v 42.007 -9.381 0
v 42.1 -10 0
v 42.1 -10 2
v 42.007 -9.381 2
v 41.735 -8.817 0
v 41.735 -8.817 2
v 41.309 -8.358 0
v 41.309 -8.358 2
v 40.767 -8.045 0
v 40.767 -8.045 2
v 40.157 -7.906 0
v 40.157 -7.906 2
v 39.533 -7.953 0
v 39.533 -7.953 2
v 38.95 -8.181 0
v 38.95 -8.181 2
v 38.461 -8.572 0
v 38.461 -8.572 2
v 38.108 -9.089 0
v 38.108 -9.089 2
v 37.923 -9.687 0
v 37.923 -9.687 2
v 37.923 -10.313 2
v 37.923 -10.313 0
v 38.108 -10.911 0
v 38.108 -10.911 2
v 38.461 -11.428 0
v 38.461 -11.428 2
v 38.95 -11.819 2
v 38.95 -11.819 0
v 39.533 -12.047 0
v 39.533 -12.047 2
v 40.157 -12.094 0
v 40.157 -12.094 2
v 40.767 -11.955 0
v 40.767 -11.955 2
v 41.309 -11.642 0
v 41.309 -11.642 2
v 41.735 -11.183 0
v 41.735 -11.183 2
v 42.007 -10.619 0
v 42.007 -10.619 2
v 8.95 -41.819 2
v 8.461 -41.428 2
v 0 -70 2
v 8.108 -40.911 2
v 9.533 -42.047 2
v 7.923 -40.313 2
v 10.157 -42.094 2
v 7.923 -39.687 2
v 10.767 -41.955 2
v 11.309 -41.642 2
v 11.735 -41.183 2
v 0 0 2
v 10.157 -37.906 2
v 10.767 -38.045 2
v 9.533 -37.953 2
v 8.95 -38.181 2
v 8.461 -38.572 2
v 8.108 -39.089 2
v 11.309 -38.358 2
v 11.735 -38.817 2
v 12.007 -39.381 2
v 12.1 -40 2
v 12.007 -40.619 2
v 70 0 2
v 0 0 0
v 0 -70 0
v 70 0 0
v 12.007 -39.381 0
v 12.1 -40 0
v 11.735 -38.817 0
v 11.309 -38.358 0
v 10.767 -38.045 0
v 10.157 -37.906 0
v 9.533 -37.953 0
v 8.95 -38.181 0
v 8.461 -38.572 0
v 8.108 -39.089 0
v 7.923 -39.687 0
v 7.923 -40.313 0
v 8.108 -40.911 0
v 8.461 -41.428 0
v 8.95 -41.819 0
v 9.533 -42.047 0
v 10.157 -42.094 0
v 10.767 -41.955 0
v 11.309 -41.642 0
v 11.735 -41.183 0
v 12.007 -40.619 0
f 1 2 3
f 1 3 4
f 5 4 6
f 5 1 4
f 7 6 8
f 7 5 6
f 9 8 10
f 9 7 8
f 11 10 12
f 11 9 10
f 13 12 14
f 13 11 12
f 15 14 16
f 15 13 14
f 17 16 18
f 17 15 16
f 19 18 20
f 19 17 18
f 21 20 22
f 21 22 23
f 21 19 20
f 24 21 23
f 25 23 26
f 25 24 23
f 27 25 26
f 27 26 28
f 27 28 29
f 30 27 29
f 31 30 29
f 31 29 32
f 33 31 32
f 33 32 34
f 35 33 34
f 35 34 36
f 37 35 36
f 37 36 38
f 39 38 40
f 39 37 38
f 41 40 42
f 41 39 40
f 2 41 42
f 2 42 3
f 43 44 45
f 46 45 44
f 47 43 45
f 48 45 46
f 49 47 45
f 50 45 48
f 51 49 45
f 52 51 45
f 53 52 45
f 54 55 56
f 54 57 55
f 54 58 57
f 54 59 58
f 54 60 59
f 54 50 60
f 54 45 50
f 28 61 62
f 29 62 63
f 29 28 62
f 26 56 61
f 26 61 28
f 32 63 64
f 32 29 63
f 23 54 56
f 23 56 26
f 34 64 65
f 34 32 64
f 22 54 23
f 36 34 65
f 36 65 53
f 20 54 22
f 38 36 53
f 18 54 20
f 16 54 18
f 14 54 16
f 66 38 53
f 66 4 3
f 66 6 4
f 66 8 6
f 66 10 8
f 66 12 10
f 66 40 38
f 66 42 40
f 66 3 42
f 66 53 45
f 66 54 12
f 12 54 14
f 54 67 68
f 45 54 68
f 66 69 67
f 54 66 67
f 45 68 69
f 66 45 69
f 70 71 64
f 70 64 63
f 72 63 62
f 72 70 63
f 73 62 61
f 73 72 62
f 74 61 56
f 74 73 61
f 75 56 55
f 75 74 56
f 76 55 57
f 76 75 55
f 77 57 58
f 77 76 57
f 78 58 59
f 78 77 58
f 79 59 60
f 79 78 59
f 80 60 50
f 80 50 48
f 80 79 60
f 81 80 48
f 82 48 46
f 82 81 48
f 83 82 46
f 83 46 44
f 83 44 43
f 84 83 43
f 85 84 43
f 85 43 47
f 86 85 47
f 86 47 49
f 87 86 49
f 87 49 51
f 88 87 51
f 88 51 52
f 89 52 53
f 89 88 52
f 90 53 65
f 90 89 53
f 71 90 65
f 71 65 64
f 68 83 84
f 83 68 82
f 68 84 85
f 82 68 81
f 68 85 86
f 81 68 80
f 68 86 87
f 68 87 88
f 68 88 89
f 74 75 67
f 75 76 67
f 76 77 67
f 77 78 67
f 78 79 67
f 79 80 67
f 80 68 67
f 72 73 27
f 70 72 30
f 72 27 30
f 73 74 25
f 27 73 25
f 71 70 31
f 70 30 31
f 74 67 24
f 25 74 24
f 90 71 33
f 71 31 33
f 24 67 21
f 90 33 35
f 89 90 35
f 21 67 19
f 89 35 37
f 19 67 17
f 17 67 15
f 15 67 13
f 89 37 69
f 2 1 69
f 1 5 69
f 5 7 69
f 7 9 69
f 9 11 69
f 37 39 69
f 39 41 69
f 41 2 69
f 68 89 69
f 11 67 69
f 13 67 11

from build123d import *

# Parameters (mm, degrees)
SKETCH_1_R      = 2.1
EXTRUDE_1_DEPTH = 2


with BuildPart() as part:
    # ｽｹｯﾁ1 → ﾎﾞｽ - 押し出し1 (new body)
    with BuildSketch(Plane.XY):
        Polygon((0, 0), (0, -70), (70, 0), align=None)
        with Locations((10, -40)):
            Circle(SKETCH_1_R, mode=Mode.SUBTRACT)
        with Locations((40, -10)):
            Circle(SKETCH_1_R, mode=Mode.SUBTRACT)
    extrude(amount=EXTRUDE_1_DEPTH)


solid = part.part
